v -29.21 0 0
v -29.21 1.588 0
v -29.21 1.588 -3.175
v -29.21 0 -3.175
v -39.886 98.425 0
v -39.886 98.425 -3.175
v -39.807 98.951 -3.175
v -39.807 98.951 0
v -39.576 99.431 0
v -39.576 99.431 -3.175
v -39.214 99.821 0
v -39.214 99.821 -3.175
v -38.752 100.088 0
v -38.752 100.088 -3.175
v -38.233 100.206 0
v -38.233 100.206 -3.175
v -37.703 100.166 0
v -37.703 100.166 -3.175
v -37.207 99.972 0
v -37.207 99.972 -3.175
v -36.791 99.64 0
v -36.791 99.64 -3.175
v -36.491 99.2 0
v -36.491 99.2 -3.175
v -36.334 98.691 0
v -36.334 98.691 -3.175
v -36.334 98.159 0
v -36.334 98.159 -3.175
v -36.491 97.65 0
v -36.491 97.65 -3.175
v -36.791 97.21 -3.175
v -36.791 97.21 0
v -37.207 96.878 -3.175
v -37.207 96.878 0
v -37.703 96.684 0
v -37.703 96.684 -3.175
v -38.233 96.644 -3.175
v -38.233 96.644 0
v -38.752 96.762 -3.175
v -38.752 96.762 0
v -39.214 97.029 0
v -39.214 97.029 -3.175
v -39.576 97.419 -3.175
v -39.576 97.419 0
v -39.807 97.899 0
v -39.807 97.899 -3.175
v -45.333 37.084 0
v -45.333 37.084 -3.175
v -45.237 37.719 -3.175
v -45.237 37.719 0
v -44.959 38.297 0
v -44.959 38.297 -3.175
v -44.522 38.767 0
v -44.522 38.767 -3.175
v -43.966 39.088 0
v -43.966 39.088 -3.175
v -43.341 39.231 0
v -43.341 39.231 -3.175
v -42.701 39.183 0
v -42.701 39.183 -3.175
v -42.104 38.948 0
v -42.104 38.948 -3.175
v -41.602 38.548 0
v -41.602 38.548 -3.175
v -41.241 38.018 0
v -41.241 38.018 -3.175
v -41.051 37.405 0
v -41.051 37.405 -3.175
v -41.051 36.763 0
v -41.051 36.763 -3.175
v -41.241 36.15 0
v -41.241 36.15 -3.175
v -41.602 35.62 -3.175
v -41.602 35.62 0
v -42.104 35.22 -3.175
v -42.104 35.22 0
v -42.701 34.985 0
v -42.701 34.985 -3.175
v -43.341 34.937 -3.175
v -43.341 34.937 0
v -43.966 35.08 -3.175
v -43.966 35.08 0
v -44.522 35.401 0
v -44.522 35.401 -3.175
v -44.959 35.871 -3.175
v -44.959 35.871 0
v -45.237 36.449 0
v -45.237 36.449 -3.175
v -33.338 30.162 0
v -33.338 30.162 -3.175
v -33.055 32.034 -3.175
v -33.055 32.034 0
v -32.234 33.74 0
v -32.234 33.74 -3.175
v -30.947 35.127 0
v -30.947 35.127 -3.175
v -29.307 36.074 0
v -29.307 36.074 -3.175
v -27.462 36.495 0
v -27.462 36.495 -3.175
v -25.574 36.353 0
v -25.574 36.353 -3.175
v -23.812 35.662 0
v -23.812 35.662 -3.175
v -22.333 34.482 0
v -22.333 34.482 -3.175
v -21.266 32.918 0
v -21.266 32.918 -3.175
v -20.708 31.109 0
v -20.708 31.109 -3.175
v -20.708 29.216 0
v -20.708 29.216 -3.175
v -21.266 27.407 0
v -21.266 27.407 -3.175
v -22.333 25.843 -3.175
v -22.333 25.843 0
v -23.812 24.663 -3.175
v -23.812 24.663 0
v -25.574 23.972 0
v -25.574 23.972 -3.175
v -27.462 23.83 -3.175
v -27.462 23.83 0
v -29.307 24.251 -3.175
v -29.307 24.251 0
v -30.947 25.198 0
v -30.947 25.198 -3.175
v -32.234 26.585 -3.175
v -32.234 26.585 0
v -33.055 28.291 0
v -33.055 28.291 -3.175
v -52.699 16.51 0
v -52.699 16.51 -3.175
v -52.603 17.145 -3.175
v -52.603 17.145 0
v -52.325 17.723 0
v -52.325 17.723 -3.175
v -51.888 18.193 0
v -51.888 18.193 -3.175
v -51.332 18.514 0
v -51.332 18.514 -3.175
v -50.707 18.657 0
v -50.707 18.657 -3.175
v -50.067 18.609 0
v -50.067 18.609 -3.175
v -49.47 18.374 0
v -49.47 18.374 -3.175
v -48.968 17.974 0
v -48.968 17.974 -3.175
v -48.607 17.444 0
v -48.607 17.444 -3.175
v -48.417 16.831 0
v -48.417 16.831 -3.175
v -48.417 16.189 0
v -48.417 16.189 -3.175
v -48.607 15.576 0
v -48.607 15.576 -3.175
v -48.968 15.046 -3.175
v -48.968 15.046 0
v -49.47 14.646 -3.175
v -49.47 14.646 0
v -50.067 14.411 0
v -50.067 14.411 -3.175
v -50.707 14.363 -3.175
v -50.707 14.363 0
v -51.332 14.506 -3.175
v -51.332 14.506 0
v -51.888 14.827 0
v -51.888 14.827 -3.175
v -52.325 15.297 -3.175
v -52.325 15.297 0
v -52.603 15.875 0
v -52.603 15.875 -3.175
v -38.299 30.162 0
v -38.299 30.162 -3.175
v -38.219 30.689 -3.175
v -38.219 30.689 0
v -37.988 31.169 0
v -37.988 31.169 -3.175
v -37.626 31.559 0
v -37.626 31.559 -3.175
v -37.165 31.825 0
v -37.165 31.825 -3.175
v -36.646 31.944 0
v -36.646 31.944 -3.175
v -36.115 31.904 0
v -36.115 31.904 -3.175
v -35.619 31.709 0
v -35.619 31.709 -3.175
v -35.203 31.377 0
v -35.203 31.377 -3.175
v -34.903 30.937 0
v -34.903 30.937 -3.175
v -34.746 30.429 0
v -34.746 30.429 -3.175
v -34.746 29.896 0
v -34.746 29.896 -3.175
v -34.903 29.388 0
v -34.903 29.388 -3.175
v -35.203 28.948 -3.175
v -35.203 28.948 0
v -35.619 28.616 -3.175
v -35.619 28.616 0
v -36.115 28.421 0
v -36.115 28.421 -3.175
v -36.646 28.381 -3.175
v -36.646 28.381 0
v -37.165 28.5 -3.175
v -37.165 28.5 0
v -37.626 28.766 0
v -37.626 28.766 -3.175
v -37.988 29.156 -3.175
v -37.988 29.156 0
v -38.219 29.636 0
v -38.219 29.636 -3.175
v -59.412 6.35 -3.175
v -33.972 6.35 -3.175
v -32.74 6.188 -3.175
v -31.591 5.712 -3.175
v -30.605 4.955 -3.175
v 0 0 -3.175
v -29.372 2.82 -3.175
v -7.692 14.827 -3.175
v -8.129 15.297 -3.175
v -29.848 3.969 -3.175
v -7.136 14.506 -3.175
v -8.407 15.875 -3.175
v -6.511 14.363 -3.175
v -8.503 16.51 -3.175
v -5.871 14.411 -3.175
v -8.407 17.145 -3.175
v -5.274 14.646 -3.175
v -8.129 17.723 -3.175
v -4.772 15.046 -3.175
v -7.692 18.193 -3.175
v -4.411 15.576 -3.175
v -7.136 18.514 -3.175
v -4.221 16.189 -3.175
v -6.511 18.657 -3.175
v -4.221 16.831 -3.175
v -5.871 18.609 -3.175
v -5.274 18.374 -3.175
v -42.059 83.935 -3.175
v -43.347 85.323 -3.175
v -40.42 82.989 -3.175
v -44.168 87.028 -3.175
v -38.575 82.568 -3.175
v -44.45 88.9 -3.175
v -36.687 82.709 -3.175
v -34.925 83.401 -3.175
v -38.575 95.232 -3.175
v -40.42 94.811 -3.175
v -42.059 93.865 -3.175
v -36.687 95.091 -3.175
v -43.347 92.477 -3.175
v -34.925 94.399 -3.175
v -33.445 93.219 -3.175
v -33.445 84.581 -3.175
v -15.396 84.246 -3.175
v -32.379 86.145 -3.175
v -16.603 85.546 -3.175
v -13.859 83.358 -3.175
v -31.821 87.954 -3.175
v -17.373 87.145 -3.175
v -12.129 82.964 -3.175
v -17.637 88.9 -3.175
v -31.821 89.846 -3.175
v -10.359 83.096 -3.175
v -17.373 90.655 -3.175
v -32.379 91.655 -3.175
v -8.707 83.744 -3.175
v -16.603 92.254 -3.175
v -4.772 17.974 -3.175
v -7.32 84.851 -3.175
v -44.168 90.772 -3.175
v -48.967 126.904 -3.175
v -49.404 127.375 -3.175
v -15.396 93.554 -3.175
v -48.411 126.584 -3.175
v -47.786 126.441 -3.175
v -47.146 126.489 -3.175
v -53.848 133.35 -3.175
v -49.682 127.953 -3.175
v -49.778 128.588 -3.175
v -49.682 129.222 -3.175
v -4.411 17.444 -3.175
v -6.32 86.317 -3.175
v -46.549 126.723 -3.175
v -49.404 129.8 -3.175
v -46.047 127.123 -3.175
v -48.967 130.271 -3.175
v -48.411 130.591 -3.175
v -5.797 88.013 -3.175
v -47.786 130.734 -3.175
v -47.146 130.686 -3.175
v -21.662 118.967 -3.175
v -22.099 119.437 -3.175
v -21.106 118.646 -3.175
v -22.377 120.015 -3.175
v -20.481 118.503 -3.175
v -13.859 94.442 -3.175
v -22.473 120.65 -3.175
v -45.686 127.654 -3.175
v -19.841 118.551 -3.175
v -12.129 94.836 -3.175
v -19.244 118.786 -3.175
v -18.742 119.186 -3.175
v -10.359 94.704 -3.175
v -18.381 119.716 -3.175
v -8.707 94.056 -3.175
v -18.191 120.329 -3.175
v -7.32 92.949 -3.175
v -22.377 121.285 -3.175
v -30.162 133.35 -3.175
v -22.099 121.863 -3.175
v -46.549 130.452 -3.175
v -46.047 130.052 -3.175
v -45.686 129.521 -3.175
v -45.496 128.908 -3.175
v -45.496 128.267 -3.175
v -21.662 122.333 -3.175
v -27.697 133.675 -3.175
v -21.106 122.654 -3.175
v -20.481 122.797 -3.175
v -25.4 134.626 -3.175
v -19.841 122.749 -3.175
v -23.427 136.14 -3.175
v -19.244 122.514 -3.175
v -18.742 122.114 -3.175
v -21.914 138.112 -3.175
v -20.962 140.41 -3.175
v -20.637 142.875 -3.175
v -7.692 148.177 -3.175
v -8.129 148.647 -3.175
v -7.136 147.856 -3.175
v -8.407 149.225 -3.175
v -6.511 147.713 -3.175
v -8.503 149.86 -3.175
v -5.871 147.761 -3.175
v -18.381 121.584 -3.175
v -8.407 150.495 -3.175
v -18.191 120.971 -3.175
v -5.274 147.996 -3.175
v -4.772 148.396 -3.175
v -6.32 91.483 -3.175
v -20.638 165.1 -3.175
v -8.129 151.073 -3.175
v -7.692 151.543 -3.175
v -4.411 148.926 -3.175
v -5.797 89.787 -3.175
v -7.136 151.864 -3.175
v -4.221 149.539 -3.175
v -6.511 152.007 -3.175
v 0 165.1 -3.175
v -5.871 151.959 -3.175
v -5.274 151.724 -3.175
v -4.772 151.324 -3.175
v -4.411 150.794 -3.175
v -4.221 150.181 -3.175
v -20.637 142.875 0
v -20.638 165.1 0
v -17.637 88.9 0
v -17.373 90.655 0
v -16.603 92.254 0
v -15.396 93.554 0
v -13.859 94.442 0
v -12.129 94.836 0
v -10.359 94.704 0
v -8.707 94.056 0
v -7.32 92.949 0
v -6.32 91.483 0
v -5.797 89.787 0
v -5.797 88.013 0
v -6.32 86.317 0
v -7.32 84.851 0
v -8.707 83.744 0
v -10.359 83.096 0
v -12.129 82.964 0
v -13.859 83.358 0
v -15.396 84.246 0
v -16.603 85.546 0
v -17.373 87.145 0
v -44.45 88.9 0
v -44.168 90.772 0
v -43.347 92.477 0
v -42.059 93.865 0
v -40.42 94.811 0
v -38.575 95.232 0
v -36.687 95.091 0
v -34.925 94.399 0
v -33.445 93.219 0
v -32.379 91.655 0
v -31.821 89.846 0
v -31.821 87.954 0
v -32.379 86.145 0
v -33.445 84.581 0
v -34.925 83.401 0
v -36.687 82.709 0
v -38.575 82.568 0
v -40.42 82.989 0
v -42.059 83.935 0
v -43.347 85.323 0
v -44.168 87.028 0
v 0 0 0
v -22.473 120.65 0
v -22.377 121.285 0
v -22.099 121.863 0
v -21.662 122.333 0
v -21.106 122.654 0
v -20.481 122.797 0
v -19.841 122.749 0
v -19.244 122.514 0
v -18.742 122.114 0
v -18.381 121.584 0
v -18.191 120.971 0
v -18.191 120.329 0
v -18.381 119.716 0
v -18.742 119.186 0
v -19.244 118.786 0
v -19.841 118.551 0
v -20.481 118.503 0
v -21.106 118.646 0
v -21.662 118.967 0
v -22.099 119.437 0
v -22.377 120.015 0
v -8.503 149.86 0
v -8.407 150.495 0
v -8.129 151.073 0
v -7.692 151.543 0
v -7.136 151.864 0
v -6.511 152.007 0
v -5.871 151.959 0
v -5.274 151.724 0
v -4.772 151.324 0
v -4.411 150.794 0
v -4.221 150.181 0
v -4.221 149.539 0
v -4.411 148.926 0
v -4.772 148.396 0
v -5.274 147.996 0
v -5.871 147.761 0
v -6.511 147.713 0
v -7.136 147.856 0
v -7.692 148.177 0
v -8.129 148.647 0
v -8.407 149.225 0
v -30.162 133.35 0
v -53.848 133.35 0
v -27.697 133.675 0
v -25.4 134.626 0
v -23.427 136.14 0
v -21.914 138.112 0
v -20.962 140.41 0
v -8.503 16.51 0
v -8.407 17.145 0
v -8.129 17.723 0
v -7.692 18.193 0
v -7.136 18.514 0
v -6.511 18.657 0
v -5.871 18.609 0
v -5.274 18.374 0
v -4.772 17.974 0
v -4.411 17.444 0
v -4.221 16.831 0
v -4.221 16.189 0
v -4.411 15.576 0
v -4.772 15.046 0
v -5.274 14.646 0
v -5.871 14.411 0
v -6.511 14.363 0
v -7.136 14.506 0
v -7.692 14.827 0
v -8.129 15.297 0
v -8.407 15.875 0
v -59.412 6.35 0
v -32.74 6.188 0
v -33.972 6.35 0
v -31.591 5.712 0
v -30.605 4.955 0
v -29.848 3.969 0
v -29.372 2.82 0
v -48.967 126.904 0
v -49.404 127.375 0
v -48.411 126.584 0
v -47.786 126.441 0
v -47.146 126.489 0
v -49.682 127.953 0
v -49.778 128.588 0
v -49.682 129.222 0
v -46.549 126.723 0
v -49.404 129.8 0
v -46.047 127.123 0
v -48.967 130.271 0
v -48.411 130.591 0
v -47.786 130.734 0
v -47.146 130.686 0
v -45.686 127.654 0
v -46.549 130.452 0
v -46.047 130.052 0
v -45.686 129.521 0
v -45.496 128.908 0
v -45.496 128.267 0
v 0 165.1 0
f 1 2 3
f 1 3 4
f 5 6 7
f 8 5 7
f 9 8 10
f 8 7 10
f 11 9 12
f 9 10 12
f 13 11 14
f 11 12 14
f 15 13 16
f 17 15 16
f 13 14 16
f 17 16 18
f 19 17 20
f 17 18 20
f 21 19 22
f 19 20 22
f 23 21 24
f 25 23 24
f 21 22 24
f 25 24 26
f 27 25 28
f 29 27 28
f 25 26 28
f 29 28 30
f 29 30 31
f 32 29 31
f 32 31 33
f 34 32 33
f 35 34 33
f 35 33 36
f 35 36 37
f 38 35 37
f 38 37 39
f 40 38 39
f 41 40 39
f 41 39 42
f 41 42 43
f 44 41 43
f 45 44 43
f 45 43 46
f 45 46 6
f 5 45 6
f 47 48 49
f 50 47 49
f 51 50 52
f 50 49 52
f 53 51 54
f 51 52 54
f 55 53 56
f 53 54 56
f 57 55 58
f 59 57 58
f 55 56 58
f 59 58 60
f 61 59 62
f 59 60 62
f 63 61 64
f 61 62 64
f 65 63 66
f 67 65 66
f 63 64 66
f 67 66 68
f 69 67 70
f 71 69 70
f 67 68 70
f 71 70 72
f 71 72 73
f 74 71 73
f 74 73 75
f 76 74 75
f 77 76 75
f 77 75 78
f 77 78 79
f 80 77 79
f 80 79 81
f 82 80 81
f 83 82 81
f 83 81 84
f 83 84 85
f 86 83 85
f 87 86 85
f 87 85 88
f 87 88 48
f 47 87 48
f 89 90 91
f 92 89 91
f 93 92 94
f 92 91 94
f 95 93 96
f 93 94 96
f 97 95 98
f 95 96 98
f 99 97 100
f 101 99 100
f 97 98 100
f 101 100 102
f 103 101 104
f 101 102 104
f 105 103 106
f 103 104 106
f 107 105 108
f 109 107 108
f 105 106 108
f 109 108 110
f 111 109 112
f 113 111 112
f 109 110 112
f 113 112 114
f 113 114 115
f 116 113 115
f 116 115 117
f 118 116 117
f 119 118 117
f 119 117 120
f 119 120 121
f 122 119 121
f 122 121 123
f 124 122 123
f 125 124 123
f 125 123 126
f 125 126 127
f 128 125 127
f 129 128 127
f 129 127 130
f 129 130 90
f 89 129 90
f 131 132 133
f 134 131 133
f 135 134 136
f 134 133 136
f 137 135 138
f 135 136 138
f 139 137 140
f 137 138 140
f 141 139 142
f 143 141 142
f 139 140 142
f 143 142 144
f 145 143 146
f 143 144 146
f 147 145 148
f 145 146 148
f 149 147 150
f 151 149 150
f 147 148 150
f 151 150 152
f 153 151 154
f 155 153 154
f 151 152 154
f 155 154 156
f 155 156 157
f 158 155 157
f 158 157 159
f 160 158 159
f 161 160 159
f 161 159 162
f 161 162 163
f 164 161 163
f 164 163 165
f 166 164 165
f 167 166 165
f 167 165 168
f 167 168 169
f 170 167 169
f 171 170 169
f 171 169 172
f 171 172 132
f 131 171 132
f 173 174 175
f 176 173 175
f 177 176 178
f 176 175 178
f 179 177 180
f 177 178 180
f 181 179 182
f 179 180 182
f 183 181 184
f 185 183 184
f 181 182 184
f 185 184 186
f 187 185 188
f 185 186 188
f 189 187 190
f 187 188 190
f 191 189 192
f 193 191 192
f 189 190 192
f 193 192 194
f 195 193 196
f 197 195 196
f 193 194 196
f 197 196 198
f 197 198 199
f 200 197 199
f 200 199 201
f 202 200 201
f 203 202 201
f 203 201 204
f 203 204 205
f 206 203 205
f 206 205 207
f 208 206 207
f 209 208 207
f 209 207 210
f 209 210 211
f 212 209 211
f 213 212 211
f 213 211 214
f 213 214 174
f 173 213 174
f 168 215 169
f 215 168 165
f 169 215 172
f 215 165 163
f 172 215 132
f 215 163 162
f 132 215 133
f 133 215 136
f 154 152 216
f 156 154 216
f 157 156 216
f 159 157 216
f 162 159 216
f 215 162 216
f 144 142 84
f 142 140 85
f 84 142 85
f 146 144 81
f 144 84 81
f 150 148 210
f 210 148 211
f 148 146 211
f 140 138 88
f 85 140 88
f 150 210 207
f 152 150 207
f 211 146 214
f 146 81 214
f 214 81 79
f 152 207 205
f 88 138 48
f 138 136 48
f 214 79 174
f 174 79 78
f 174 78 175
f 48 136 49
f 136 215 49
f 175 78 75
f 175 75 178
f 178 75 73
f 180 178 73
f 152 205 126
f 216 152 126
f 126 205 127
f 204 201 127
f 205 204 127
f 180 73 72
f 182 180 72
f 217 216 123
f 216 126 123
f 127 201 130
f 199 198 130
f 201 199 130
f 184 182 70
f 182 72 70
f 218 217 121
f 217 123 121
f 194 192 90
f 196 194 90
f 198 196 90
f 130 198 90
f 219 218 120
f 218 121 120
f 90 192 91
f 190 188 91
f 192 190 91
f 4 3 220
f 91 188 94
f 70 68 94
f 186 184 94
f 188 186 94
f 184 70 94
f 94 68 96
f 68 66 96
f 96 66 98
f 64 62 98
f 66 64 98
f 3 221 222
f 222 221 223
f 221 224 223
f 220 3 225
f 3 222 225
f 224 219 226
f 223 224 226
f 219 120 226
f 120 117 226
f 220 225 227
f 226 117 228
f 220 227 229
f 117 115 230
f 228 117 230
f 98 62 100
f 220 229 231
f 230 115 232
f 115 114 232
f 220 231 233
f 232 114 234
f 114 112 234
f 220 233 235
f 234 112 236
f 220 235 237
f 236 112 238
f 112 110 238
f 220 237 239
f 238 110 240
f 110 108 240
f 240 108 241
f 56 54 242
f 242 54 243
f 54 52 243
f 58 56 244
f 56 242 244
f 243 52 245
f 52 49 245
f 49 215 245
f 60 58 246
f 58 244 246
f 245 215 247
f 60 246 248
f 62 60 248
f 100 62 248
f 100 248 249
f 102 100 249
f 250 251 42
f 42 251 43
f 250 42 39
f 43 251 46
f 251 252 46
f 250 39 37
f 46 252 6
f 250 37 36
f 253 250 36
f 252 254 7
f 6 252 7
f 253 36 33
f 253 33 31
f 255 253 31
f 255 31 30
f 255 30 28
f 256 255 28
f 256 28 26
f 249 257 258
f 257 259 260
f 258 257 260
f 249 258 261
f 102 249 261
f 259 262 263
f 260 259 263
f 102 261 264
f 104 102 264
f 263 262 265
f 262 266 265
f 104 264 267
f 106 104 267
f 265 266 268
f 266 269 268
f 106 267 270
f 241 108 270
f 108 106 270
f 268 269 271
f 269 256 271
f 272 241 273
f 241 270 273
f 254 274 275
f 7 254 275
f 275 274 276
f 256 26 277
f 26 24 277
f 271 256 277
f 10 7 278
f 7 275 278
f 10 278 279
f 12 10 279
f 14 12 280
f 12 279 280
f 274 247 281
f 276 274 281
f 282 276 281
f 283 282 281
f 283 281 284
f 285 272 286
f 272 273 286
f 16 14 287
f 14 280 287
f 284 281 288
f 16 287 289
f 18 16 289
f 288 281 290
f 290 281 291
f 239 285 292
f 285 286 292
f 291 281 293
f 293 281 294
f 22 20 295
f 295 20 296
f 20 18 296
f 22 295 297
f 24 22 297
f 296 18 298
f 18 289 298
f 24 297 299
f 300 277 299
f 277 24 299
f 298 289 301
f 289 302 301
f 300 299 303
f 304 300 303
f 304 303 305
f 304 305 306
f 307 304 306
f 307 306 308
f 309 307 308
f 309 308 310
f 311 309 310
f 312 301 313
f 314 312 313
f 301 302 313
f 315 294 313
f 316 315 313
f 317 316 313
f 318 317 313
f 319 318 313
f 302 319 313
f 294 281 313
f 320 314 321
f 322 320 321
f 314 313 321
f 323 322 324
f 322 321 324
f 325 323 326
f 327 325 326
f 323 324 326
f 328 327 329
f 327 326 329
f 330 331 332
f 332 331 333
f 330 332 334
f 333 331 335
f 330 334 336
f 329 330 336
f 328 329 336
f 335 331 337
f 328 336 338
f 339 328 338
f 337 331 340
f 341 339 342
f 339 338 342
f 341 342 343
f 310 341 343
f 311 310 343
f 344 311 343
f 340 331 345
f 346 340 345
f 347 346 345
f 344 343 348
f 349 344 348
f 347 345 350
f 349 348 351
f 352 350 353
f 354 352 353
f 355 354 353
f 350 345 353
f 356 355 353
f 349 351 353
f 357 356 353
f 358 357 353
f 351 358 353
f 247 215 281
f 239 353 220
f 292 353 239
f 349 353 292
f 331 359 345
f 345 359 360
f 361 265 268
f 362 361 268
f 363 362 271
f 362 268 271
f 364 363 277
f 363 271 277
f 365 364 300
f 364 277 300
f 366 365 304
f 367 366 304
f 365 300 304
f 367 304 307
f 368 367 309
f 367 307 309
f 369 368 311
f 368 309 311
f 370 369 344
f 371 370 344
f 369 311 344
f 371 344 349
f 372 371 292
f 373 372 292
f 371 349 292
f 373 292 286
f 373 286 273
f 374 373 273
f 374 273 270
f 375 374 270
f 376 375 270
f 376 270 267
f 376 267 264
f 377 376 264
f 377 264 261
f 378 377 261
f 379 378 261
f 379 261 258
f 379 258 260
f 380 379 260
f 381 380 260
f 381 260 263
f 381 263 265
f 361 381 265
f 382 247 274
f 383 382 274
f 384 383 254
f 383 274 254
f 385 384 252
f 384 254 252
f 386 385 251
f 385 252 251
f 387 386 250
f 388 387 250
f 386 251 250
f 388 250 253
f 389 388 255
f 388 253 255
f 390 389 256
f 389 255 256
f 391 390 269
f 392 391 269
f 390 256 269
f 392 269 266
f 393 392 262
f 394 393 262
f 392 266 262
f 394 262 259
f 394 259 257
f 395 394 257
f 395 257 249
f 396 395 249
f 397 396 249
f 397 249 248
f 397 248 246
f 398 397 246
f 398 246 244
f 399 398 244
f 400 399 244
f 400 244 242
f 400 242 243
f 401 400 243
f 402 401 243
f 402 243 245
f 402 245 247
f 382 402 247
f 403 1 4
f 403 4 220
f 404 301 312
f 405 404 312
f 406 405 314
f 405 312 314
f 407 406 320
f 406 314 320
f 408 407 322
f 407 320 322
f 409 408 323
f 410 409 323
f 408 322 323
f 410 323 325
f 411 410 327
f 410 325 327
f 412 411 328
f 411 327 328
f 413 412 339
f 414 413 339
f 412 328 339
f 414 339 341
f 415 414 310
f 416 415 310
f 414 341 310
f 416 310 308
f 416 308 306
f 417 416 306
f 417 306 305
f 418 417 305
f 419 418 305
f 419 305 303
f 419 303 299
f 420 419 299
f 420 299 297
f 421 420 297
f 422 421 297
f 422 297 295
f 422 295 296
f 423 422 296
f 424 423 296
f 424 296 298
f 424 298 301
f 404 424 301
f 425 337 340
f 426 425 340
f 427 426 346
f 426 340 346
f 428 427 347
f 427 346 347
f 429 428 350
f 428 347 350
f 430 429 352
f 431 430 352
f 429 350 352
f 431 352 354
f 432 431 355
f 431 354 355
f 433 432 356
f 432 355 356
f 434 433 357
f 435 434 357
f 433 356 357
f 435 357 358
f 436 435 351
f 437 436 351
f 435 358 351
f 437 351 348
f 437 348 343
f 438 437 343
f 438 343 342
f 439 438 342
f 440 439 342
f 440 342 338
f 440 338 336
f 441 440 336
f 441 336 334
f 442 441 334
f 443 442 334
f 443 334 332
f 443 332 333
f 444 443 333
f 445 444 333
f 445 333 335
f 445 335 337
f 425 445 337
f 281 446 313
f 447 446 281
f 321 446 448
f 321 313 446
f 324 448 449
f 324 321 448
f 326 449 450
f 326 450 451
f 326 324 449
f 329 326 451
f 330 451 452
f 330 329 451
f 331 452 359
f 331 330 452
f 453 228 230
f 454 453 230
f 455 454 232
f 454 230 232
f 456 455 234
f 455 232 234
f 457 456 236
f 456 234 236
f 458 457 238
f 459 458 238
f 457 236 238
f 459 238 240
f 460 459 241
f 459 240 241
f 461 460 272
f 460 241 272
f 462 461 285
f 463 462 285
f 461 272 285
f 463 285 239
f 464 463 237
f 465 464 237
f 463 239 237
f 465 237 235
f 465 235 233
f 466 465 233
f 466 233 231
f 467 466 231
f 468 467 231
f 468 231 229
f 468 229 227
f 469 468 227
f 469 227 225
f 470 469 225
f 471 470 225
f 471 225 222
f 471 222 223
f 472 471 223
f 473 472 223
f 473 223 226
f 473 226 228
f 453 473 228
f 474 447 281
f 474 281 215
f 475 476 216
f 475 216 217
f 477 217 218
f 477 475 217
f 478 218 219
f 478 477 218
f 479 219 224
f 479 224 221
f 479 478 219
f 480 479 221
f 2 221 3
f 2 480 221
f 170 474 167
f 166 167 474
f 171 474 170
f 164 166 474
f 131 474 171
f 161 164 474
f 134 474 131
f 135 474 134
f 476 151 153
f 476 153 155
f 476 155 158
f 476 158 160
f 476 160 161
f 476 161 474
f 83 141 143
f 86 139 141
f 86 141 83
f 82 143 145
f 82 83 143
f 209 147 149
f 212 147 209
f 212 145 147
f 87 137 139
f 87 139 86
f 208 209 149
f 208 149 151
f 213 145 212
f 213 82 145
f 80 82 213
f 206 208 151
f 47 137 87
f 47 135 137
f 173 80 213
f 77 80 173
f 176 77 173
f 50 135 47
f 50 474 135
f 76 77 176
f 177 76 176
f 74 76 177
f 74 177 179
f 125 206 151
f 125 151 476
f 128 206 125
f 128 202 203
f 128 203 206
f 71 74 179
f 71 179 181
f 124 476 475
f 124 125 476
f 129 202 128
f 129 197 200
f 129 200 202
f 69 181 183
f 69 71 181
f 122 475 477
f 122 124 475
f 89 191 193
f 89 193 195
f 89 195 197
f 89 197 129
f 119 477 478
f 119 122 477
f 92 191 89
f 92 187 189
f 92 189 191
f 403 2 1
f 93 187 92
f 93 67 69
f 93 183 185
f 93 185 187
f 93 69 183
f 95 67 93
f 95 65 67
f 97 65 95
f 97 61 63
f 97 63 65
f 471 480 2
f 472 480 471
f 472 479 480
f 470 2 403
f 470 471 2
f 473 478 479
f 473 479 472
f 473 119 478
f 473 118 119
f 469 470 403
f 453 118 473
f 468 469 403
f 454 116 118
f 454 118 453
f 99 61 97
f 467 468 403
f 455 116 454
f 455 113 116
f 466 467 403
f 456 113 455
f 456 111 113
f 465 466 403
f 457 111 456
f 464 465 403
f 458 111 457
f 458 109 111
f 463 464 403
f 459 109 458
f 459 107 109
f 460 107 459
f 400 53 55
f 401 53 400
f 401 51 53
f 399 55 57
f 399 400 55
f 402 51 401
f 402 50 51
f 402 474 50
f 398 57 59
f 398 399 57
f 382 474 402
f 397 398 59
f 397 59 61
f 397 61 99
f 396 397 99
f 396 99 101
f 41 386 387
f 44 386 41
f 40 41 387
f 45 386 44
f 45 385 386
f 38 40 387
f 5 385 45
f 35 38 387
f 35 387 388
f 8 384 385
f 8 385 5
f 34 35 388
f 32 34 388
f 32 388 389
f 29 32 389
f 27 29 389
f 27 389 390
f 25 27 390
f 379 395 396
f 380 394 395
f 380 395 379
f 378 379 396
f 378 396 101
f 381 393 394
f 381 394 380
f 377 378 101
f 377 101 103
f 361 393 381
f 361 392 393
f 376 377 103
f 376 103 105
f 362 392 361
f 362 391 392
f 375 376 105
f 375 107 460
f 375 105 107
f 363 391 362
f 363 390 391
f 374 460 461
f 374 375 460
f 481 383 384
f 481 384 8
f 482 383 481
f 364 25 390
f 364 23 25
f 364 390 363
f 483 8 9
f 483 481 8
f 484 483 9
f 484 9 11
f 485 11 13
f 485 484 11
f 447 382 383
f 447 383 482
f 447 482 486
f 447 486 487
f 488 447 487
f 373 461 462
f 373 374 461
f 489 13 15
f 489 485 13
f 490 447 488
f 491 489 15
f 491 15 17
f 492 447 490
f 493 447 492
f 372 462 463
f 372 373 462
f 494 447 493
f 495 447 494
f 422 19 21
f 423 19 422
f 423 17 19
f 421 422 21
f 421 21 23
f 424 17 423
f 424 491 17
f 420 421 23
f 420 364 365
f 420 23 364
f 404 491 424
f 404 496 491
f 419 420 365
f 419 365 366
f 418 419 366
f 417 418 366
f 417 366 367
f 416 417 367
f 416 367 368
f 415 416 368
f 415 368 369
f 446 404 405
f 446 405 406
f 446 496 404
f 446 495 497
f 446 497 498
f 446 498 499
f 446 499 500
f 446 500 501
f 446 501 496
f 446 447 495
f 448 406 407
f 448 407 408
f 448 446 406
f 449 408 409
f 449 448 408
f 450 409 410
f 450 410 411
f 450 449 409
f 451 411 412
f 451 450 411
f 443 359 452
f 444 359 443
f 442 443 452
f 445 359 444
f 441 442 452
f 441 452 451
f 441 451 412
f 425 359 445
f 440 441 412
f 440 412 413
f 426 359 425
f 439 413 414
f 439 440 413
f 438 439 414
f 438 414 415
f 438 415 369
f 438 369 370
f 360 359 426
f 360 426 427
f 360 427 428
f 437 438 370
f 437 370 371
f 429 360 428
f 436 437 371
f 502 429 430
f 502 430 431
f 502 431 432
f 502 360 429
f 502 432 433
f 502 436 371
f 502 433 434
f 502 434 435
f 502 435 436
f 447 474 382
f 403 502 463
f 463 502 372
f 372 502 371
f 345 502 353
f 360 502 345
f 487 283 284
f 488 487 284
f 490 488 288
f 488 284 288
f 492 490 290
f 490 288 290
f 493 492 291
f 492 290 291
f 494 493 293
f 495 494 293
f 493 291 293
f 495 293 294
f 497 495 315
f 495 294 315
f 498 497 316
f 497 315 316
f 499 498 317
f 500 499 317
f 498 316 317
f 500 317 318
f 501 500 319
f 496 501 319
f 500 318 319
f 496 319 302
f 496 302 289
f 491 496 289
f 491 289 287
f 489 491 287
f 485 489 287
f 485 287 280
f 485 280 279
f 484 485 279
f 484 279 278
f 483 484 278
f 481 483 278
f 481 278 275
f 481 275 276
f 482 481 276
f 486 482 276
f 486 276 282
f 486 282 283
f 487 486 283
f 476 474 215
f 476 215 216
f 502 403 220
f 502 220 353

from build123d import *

# Parameters (mm, degrees)
BOSS_EXTRUDE1_DEPTH              = 3.175
F_6_CLEARANCE_HOLE1_D            = 4.3053
F_6_CLEARANCE_HOLE2_D            = 4.3053
F_9_64_0_14063_DIAMETER_HOLE1_D  = 3.572002
F_15_32_0_46875_DIAMETER_HOLE1_D = 11.90625
F_1_2_0_5_DIAMETER_HOLE1_D       = 12.7
CUT_EXTRUDE1_REACH               = 5.175
SKETCH12_W                       = 9.525
SKETCH12_H                       = 31.75
FILLET1_R                        = 9.525


with BuildPart() as part:
    # Sketch1 → Boss-Extrude1 (new body)
    with BuildSketch(Plane.XY):
        with BuildLine():
            Line((-29.21, 1.5875), (-29.21, 0))
            Line((-29.21, 0), (0, 0))
            Line((0, 0), (0, 165.1))
            Line((0, 165.1), (-25.4, 165.1))
            Line((-25.4, 165.1), (-25.4, 138.1125))
            ThreePointArc((-25.4, 138.1125), (-26.794903955, 134.744903955), (-30.1625, 133.35))
            Line((-30.1625, 133.35), (-53.848, 133.35))
            Line((-53.848, 133.35), (-59.411809524, 6.35))
            Line((-59.411809524, 6.35), (-33.9725, 6.35))
            ThreePointArc((-33.9725, 6.35), (-30.604903955, 4.955096045), (-29.21, 1.5875))
        make_face()
    extrude(amount=-BOSS_EXTRUDE1_DEPTH)

    # #6 Clearance Hole1 (through all)
    with Locations(Plane.XY):
        with Locations((-47.625, 128.5875), (-6.35, 149.86), (-50.546, 16.51), (-6.35, 16.51)):
            Hole(F_6_CLEARANCE_HOLE1_D / 2)

    # #6 Clearance Hole2 (through all)
    with Locations(Plane.XY):
        with Locations((-43.18, 37.084), (-20.32, 120.65)):
            Hole(F_6_CLEARANCE_HOLE2_D / 2)

    # 9/64 (0.14063) Diameter Hole1 (through all)
    with Locations(Plane.XY):
        with Locations((-38.1, 98.425), (-36.5125, 30.1625)):
            Hole(F_9_64_0_14063_DIAMETER_HOLE1_D / 2)

    # 15/32 (0.46875) Diameter Hole1 (through all)
    with Locations(Plane.XY):
        with Locations((-11.684, 88.9)):
            Hole(F_15_32_0_46875_DIAMETER_HOLE1_D / 2)

    # 1/2 (0.5) Diameter Hole1 (through all)
    with Locations(Plane.XY):
        with Locations((-38.1, 88.9), (-26.9875, 30.1625)):
            Hole(F_1_2_0_5_DIAMETER_HOLE1_D / 2)

    # Sketch12 → Cut-Extrude1 (cut, up to next)
    with BuildSketch(Plane.XY, mode=Mode.PRIVATE) as cut_extrude1_sk1:
        with Locations((-25.4, 149.225)):
            Rectangle(SKETCH12_W, SKETCH12_H)
    cut_extrude1_tool1 = extrude(cut_extrude1_sk1.sketch, amount=-CUT_EXTRUDE1_REACH, mode=Mode.PRIVATE) & part.part
    add(cut_extrude1_tool1.solids().sort_by_distance((-25.4, 149.225, 0))[0], mode=Mode.SUBTRACT)

    # Fillet1
    fillet1_edges = [part.edges().sort_by_distance(p)[0] for p in [
        (-20.6375, 133.35, -1.5875),
    ]]
    fillet(fillet1_edges, radius=FILLET1_R)


solid = part.part
